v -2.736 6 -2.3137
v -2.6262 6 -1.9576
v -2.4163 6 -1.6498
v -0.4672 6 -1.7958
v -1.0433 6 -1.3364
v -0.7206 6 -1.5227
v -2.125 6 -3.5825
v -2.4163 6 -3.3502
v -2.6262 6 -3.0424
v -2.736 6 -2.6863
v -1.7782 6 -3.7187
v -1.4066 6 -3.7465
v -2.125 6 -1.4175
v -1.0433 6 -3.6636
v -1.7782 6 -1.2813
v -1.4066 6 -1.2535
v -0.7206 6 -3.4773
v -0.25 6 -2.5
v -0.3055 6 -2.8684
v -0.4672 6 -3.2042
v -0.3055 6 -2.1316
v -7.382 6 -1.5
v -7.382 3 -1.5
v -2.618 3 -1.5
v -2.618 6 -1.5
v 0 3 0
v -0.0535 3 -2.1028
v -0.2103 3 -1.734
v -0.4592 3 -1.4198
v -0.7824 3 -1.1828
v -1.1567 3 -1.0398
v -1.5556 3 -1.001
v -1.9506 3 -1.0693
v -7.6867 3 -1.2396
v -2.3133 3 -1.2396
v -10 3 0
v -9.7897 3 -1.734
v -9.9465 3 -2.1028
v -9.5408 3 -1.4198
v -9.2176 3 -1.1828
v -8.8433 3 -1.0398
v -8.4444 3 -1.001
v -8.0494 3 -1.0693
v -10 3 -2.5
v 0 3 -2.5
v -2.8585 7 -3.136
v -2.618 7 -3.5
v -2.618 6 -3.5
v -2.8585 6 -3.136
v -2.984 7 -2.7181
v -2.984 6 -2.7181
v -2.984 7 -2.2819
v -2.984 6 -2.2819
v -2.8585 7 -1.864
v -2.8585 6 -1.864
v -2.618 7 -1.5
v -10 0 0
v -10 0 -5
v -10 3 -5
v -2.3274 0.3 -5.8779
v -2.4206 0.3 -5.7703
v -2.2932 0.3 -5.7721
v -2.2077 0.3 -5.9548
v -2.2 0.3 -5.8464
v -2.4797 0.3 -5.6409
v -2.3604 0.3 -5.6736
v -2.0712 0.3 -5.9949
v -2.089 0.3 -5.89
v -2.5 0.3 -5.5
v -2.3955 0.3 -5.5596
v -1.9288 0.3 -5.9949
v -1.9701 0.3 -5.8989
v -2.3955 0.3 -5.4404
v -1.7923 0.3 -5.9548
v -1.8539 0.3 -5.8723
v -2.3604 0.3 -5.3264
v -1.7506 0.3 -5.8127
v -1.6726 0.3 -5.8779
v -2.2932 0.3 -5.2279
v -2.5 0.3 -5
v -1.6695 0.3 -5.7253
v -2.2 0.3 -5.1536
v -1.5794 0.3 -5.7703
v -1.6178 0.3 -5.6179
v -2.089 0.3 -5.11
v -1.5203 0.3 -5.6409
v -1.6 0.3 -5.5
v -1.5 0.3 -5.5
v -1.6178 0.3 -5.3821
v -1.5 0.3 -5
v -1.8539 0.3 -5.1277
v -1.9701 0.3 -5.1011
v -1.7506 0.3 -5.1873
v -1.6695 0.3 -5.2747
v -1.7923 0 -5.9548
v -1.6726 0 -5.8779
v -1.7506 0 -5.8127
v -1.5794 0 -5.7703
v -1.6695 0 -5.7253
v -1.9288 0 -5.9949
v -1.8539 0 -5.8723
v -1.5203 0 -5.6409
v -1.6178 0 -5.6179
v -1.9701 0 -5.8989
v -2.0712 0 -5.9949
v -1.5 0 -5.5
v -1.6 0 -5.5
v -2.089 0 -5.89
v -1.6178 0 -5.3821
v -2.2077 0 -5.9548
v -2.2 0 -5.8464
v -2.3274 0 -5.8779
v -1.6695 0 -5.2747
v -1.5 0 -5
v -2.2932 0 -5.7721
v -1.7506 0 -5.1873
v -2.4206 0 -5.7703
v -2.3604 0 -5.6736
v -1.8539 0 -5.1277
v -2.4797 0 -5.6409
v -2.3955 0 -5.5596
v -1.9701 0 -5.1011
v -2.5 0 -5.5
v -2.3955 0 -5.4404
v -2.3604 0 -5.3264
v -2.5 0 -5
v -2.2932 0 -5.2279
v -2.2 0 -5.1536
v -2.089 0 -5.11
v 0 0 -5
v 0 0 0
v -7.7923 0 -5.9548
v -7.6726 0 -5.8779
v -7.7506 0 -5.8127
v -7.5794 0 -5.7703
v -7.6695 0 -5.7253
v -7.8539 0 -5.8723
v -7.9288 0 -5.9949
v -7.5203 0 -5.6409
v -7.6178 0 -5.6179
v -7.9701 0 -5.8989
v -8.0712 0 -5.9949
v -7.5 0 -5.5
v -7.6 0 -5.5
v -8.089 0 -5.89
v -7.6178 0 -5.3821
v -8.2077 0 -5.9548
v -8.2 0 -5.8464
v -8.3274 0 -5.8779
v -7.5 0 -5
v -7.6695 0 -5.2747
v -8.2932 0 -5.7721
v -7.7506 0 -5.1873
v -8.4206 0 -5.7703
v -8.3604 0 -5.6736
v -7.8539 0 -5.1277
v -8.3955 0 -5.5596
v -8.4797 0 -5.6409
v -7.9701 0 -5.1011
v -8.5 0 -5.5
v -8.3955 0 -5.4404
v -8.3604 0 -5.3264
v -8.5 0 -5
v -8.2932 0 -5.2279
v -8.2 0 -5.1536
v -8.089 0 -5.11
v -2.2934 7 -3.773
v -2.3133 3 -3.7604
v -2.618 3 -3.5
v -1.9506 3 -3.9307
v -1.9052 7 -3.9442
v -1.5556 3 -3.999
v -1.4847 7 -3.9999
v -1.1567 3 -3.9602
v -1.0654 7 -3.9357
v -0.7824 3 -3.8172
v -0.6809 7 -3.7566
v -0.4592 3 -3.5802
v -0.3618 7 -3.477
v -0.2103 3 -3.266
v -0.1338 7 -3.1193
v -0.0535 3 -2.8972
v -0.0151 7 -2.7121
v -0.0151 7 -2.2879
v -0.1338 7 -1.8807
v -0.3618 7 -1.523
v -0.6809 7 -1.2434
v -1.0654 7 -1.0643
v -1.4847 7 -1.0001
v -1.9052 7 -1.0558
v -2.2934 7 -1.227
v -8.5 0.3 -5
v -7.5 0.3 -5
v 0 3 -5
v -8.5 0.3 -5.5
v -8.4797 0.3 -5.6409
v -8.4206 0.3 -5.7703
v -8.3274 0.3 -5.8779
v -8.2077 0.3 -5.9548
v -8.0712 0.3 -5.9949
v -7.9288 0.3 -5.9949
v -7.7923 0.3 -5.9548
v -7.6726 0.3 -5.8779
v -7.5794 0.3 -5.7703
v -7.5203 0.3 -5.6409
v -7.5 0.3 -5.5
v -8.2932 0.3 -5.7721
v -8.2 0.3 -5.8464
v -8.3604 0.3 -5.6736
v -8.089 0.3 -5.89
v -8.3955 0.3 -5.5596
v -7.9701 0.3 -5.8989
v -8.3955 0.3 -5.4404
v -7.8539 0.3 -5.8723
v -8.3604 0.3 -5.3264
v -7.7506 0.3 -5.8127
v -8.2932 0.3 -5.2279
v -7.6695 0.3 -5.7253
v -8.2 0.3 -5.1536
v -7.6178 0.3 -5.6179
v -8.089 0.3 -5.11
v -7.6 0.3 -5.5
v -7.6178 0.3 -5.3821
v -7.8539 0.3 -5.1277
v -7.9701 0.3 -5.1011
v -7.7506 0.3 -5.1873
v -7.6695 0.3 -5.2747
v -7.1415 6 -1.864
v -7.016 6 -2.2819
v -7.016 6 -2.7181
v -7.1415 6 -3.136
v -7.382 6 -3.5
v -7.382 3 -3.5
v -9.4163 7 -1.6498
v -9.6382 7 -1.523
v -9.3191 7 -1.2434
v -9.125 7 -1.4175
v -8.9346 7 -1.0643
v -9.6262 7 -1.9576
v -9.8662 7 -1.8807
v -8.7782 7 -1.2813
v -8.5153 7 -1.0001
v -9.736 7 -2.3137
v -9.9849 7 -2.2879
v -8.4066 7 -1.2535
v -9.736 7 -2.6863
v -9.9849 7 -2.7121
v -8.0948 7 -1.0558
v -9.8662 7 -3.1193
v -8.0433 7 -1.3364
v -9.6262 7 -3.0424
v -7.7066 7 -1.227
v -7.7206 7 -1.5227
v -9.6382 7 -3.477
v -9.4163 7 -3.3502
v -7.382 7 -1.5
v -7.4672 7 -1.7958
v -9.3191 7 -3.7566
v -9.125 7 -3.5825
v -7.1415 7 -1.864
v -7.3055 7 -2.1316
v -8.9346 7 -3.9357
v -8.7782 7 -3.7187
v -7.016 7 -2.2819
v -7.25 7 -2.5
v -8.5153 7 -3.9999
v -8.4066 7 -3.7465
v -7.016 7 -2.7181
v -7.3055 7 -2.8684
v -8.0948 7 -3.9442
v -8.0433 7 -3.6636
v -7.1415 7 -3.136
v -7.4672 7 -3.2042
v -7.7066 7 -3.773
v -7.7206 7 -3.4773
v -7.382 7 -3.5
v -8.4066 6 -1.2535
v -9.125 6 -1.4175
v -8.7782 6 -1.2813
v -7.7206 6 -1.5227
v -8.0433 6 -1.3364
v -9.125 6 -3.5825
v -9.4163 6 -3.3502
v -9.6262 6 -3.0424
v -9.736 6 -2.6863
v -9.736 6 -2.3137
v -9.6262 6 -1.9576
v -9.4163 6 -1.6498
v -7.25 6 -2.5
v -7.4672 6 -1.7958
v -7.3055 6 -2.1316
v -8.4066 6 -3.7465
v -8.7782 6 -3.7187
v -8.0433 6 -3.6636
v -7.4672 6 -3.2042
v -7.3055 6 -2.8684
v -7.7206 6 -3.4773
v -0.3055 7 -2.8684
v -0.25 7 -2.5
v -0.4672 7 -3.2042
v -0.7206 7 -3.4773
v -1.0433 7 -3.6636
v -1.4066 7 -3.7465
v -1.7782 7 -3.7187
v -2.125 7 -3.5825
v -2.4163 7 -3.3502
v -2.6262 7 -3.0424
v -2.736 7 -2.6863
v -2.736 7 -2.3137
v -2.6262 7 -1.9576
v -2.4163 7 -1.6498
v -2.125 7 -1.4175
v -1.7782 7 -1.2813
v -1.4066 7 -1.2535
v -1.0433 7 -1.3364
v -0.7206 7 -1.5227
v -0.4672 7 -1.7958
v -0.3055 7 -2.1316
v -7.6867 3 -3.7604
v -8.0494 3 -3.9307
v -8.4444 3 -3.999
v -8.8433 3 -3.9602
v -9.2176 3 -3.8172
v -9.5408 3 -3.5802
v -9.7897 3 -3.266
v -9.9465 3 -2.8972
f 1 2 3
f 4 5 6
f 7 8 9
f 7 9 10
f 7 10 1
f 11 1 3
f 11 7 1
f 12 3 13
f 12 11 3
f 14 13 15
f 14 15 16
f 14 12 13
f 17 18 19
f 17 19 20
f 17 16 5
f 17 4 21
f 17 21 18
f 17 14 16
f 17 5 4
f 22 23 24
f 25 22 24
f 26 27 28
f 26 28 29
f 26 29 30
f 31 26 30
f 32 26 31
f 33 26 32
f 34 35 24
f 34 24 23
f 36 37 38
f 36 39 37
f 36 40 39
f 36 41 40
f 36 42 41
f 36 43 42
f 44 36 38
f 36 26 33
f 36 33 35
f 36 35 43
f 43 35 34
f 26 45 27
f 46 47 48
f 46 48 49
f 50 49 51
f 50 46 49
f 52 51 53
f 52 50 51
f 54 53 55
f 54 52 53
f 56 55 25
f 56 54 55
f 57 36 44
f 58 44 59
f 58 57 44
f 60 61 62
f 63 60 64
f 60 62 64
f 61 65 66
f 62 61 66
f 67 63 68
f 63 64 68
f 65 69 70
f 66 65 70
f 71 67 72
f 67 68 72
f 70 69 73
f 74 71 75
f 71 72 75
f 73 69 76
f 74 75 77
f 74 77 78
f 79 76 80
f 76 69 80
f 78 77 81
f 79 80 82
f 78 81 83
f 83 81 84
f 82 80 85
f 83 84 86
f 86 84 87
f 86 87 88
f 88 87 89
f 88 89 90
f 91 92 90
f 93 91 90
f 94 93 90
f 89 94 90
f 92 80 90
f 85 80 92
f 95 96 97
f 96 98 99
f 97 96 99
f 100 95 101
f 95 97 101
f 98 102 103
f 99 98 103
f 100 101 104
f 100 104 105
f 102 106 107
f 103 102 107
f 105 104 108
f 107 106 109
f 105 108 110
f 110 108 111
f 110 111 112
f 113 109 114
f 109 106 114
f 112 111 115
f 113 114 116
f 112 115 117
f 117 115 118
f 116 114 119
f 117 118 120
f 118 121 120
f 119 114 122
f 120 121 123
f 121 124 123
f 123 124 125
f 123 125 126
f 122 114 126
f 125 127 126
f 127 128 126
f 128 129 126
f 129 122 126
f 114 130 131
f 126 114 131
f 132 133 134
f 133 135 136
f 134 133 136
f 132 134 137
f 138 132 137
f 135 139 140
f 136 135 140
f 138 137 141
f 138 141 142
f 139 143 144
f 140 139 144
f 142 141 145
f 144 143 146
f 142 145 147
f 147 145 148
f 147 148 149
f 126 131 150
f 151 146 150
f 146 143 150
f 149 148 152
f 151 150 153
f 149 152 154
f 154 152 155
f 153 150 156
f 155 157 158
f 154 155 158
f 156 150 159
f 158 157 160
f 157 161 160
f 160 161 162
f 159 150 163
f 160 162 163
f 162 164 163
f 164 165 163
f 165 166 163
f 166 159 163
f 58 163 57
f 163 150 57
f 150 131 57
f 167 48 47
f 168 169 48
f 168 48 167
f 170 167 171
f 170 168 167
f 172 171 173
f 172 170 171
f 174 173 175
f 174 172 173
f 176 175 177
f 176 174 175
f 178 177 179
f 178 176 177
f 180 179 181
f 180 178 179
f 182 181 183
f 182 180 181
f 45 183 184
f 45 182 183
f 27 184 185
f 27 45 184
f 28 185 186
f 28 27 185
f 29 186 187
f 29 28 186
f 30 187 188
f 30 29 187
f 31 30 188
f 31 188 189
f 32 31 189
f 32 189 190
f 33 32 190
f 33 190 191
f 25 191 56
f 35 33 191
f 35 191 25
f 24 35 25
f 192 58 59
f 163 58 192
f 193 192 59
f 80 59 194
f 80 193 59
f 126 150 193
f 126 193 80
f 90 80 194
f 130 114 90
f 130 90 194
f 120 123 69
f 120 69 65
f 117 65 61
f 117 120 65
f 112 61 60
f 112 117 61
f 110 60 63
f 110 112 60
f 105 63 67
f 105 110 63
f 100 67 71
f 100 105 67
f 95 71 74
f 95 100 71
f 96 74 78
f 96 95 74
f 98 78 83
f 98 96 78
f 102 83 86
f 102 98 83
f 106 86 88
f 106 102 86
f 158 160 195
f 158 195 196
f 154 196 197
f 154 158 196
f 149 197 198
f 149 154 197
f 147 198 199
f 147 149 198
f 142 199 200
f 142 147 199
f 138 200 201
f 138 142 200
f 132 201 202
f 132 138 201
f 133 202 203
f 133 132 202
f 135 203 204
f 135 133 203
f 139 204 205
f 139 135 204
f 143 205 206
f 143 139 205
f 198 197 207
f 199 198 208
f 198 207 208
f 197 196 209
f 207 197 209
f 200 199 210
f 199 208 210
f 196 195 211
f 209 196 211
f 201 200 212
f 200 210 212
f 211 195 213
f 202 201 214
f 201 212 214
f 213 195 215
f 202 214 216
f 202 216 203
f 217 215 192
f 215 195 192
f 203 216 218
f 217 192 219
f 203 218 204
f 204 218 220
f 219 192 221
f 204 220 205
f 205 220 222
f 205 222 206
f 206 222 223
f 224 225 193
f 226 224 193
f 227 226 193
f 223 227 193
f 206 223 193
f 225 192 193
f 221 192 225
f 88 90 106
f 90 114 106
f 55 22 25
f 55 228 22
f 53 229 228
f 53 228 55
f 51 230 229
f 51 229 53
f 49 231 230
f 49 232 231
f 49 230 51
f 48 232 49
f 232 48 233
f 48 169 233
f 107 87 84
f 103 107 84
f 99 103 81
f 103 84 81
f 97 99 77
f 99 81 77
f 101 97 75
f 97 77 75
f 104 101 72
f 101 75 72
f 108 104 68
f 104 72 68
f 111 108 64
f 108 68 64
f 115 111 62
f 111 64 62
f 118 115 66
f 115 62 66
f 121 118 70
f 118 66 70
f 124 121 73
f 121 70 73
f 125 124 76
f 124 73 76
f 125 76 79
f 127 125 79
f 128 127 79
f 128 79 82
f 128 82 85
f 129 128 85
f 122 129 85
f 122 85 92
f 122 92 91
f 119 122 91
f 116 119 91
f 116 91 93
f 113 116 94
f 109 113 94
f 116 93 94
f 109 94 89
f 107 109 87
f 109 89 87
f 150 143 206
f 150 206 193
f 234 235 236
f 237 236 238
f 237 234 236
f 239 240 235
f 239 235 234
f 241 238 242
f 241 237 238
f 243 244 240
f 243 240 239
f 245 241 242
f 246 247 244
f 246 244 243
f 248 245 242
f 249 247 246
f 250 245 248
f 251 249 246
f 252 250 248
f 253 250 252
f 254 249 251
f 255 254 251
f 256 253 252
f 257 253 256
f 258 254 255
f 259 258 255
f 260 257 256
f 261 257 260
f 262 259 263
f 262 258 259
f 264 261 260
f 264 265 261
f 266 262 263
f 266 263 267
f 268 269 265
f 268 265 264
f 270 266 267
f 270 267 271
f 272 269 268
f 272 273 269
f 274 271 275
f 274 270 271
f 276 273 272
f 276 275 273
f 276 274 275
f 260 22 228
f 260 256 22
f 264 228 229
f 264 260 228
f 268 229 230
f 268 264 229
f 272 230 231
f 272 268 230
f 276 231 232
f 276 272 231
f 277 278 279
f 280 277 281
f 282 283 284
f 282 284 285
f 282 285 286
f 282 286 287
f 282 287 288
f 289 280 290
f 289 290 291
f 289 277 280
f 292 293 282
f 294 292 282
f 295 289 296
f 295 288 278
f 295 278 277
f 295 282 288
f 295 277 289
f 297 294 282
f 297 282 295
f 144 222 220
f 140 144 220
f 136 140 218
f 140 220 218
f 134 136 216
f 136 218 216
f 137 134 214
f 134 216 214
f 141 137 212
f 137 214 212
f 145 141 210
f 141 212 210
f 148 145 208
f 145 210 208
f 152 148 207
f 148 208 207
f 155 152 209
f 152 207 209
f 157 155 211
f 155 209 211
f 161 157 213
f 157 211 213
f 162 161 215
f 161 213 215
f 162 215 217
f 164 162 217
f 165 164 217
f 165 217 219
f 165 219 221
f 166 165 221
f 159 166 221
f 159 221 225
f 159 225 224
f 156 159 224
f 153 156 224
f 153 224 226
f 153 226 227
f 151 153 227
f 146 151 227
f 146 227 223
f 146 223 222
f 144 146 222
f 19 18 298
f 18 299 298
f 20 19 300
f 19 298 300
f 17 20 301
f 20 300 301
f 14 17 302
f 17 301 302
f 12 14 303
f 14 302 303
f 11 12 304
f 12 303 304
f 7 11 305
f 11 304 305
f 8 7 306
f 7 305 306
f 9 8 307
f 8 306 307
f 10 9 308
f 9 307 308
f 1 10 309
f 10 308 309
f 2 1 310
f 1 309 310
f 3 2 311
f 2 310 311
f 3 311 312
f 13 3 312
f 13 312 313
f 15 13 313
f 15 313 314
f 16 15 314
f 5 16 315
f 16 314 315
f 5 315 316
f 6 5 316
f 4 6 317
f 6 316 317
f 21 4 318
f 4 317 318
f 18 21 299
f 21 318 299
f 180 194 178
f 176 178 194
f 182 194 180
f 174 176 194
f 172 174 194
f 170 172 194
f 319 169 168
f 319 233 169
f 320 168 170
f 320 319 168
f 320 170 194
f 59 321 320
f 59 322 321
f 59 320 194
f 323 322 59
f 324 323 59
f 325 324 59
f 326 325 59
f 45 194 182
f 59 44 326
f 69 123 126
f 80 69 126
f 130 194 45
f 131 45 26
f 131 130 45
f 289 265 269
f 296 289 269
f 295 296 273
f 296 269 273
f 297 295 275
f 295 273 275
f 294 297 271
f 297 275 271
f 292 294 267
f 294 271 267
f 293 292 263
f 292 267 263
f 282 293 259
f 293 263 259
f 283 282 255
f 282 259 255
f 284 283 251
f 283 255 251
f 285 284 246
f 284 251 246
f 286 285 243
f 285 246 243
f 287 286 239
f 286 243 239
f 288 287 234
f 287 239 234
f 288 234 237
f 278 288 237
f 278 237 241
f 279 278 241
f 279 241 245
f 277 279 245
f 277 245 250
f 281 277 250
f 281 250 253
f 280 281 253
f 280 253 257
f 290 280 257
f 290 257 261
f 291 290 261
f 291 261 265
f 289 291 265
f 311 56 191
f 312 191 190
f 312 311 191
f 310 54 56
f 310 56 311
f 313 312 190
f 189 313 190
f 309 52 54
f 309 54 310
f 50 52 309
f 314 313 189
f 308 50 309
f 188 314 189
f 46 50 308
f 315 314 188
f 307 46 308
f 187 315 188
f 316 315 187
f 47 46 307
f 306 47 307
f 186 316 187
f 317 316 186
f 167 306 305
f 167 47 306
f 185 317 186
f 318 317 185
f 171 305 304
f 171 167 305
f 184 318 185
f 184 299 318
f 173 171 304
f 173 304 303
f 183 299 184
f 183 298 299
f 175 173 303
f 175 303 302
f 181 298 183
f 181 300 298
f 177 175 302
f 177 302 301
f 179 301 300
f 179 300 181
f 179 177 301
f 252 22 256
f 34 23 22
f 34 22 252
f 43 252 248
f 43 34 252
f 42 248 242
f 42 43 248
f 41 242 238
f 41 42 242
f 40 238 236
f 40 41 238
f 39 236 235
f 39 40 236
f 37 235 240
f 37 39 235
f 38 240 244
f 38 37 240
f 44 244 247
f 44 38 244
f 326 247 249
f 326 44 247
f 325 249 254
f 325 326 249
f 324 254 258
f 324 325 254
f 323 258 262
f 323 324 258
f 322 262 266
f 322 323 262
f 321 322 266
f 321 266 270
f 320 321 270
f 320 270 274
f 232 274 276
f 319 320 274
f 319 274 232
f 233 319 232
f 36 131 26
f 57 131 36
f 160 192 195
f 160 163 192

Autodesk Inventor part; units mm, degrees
ref_plane "YZ Plane" through (0, 0, 0) normal (1, 0, 0) x (0, 1, 0)
ref_plane "XZ Plane" through (0, 0, 0) normal (0, 1, 0) x (-1, 0, 0)
ref_plane "XY Plane" through (0, 0, 0) normal (0, 0, 1) x (1, 0, 0)
sketch "Sketch1" plane through (0, 0, 0) normal (0, 1, 0) x (-1, 0, 0)
  point P0 (0, 0)
sketch "Sketch2" plane through (0, 0, 0) normal (0, 1, 0) x (-1, 0, 0)
  line L0 (0, 0) -> (10, 0)
  line L1 (10, 0) -> (10, -5)
  line L2 (10, -5) -> (0, -5)
  line L3 (0, -5) -> (0, 0)
  dimension "d0" = 10
  dimension "d1" = 5
extrude "Extrusion1" add sketch "Sketch2" along normal blind 3
sketch "Sketch3" plane through (0, 3, 0) normal (0, 1, 0) x (1, 0, 0)
  line L0 (-10, 5) -> (-10, 0) projected
  line L1 (-10, 2.5) -> (0, 2.5)
  line L2 (-10, 2.5) -> (-8.5, 2.5)
  line L3 (0, 2.5) -> (-1.5, 2.5)
  circle A0 centre (-8.5, 2.5) radius 1.5
  circle A1 centre (-1.5, 2.5) radius 1.5
  line L4 (0, 0) -> (0, 5) projected
  line L5 (-7.382, 1.5) -> (-2.618, 1.5)
  line L6 (-2.618, 3.5) -> (-7.382, 3.5)
extrude "Extrusion2" add sketch "Sketch3" along normal blind 4
sketch "Sketch4" plane through (0, 7, 0) normal (0, 1, 0) x (1, 0, 0)
  arc A0 (-10, 2.5) -> (-7.382, 1.5) centre (-8.5, 2.5) ccw projected
  circle A1 centre (-8.5, 2.5) radius 1.25
  arc A2 (-2.618, 1.5) -> (-2.618, 3.5) centre (-1.5, 2.5) ccw projected
  circle A3 centre (-1.5, 2.5) radius 1.25
  arc A4 (-2.618, 3.5) -> (-2.618, 1.5) centre (-1.5, 2.5) ccw
  arc A5 (-7.382, 1.5) -> (-7.382, 3.5) centre (-8.5, 2.5) ccw
  line L0 (-7.382, 1.5) -> (-2.618, 1.5)
  line L1 (-7.382, 3.5) -> (-2.618, 3.5)
  point P0 (0, 0)
extrude "Extrusion3" cut sketch "Sketch4" against normal blind 1 contours A1 | L0 A5 L1 A4 | A3
sketch "Sketch5" plane through (0, 0, 0) normal (0, -1, 0) x (1, 0, 0)
  line L0 (0, -5) -> (-10, -5) projected
  line L1 (0, -5) -> (-2, -5)
  line L2 (-10, -5) -> (-8, -5)
  line L3 (-2, -5) -> (-1.5, -5)
  line L4 (-1.5, -5) -> (-1.5, -5.5)
  line L5 (-2.5, -5.5) -> (-2.5, -5)
  line L6 (-2.5, -5) -> (-2, -5)
  line L7 (-8, -5) -> (-8.5, -5)
  line L8 (-8.5, -5) -> (-8.5, -5.5)
  line L9 (-7.5, -5.5) -> (-7.5, -5)
  line L10 (-7.5, -5) -> (-8, -5)
  arc A0 (-2.5, -5.5) -> (-1.5, -5.5) centre (-2, -5.5) ccw
  arc A1 (-8.5, -5.5) -> (-7.5, -5.5) centre (-8, -5.5) ccw
  point P0 (0, 0)
  dimension "d19" = 2
extrude "Extrusion4" add sketch "Sketch5" against normal blind 0.3
sketch "Sketch6" plane through (0, 0.3, 0) normal (0, 1, 0) x (1, 0, 0)
  arc A0 (-1.5, 5.5) -> (-2.5, 5.5) centre (-2, 5.5) ccw projected
  circle A1 centre (-2, 5.5) radius 0.4
  arc A2 (-7.5, 5.5) -> (-8.5, 5.5) centre (-8, 5.5) ccw projected
  circle A3 centre (-8, 5.5) radius 0.4
  point P0 (0, 0)
  dimension "d30" = 0.8
  dimension "d31" = 0.8
extrude "Extrusion5" cut sketch "Sketch6" against normal blind 0.3
thread "Thread1" size "M0.3x0.08" class "6H" standard "ISO Metric profile" full length
thread "Thread2" size "M0.3x0.08" class "6H" standard "ANSI Metric M Profile" full length
properties part number "distanceSensor"
